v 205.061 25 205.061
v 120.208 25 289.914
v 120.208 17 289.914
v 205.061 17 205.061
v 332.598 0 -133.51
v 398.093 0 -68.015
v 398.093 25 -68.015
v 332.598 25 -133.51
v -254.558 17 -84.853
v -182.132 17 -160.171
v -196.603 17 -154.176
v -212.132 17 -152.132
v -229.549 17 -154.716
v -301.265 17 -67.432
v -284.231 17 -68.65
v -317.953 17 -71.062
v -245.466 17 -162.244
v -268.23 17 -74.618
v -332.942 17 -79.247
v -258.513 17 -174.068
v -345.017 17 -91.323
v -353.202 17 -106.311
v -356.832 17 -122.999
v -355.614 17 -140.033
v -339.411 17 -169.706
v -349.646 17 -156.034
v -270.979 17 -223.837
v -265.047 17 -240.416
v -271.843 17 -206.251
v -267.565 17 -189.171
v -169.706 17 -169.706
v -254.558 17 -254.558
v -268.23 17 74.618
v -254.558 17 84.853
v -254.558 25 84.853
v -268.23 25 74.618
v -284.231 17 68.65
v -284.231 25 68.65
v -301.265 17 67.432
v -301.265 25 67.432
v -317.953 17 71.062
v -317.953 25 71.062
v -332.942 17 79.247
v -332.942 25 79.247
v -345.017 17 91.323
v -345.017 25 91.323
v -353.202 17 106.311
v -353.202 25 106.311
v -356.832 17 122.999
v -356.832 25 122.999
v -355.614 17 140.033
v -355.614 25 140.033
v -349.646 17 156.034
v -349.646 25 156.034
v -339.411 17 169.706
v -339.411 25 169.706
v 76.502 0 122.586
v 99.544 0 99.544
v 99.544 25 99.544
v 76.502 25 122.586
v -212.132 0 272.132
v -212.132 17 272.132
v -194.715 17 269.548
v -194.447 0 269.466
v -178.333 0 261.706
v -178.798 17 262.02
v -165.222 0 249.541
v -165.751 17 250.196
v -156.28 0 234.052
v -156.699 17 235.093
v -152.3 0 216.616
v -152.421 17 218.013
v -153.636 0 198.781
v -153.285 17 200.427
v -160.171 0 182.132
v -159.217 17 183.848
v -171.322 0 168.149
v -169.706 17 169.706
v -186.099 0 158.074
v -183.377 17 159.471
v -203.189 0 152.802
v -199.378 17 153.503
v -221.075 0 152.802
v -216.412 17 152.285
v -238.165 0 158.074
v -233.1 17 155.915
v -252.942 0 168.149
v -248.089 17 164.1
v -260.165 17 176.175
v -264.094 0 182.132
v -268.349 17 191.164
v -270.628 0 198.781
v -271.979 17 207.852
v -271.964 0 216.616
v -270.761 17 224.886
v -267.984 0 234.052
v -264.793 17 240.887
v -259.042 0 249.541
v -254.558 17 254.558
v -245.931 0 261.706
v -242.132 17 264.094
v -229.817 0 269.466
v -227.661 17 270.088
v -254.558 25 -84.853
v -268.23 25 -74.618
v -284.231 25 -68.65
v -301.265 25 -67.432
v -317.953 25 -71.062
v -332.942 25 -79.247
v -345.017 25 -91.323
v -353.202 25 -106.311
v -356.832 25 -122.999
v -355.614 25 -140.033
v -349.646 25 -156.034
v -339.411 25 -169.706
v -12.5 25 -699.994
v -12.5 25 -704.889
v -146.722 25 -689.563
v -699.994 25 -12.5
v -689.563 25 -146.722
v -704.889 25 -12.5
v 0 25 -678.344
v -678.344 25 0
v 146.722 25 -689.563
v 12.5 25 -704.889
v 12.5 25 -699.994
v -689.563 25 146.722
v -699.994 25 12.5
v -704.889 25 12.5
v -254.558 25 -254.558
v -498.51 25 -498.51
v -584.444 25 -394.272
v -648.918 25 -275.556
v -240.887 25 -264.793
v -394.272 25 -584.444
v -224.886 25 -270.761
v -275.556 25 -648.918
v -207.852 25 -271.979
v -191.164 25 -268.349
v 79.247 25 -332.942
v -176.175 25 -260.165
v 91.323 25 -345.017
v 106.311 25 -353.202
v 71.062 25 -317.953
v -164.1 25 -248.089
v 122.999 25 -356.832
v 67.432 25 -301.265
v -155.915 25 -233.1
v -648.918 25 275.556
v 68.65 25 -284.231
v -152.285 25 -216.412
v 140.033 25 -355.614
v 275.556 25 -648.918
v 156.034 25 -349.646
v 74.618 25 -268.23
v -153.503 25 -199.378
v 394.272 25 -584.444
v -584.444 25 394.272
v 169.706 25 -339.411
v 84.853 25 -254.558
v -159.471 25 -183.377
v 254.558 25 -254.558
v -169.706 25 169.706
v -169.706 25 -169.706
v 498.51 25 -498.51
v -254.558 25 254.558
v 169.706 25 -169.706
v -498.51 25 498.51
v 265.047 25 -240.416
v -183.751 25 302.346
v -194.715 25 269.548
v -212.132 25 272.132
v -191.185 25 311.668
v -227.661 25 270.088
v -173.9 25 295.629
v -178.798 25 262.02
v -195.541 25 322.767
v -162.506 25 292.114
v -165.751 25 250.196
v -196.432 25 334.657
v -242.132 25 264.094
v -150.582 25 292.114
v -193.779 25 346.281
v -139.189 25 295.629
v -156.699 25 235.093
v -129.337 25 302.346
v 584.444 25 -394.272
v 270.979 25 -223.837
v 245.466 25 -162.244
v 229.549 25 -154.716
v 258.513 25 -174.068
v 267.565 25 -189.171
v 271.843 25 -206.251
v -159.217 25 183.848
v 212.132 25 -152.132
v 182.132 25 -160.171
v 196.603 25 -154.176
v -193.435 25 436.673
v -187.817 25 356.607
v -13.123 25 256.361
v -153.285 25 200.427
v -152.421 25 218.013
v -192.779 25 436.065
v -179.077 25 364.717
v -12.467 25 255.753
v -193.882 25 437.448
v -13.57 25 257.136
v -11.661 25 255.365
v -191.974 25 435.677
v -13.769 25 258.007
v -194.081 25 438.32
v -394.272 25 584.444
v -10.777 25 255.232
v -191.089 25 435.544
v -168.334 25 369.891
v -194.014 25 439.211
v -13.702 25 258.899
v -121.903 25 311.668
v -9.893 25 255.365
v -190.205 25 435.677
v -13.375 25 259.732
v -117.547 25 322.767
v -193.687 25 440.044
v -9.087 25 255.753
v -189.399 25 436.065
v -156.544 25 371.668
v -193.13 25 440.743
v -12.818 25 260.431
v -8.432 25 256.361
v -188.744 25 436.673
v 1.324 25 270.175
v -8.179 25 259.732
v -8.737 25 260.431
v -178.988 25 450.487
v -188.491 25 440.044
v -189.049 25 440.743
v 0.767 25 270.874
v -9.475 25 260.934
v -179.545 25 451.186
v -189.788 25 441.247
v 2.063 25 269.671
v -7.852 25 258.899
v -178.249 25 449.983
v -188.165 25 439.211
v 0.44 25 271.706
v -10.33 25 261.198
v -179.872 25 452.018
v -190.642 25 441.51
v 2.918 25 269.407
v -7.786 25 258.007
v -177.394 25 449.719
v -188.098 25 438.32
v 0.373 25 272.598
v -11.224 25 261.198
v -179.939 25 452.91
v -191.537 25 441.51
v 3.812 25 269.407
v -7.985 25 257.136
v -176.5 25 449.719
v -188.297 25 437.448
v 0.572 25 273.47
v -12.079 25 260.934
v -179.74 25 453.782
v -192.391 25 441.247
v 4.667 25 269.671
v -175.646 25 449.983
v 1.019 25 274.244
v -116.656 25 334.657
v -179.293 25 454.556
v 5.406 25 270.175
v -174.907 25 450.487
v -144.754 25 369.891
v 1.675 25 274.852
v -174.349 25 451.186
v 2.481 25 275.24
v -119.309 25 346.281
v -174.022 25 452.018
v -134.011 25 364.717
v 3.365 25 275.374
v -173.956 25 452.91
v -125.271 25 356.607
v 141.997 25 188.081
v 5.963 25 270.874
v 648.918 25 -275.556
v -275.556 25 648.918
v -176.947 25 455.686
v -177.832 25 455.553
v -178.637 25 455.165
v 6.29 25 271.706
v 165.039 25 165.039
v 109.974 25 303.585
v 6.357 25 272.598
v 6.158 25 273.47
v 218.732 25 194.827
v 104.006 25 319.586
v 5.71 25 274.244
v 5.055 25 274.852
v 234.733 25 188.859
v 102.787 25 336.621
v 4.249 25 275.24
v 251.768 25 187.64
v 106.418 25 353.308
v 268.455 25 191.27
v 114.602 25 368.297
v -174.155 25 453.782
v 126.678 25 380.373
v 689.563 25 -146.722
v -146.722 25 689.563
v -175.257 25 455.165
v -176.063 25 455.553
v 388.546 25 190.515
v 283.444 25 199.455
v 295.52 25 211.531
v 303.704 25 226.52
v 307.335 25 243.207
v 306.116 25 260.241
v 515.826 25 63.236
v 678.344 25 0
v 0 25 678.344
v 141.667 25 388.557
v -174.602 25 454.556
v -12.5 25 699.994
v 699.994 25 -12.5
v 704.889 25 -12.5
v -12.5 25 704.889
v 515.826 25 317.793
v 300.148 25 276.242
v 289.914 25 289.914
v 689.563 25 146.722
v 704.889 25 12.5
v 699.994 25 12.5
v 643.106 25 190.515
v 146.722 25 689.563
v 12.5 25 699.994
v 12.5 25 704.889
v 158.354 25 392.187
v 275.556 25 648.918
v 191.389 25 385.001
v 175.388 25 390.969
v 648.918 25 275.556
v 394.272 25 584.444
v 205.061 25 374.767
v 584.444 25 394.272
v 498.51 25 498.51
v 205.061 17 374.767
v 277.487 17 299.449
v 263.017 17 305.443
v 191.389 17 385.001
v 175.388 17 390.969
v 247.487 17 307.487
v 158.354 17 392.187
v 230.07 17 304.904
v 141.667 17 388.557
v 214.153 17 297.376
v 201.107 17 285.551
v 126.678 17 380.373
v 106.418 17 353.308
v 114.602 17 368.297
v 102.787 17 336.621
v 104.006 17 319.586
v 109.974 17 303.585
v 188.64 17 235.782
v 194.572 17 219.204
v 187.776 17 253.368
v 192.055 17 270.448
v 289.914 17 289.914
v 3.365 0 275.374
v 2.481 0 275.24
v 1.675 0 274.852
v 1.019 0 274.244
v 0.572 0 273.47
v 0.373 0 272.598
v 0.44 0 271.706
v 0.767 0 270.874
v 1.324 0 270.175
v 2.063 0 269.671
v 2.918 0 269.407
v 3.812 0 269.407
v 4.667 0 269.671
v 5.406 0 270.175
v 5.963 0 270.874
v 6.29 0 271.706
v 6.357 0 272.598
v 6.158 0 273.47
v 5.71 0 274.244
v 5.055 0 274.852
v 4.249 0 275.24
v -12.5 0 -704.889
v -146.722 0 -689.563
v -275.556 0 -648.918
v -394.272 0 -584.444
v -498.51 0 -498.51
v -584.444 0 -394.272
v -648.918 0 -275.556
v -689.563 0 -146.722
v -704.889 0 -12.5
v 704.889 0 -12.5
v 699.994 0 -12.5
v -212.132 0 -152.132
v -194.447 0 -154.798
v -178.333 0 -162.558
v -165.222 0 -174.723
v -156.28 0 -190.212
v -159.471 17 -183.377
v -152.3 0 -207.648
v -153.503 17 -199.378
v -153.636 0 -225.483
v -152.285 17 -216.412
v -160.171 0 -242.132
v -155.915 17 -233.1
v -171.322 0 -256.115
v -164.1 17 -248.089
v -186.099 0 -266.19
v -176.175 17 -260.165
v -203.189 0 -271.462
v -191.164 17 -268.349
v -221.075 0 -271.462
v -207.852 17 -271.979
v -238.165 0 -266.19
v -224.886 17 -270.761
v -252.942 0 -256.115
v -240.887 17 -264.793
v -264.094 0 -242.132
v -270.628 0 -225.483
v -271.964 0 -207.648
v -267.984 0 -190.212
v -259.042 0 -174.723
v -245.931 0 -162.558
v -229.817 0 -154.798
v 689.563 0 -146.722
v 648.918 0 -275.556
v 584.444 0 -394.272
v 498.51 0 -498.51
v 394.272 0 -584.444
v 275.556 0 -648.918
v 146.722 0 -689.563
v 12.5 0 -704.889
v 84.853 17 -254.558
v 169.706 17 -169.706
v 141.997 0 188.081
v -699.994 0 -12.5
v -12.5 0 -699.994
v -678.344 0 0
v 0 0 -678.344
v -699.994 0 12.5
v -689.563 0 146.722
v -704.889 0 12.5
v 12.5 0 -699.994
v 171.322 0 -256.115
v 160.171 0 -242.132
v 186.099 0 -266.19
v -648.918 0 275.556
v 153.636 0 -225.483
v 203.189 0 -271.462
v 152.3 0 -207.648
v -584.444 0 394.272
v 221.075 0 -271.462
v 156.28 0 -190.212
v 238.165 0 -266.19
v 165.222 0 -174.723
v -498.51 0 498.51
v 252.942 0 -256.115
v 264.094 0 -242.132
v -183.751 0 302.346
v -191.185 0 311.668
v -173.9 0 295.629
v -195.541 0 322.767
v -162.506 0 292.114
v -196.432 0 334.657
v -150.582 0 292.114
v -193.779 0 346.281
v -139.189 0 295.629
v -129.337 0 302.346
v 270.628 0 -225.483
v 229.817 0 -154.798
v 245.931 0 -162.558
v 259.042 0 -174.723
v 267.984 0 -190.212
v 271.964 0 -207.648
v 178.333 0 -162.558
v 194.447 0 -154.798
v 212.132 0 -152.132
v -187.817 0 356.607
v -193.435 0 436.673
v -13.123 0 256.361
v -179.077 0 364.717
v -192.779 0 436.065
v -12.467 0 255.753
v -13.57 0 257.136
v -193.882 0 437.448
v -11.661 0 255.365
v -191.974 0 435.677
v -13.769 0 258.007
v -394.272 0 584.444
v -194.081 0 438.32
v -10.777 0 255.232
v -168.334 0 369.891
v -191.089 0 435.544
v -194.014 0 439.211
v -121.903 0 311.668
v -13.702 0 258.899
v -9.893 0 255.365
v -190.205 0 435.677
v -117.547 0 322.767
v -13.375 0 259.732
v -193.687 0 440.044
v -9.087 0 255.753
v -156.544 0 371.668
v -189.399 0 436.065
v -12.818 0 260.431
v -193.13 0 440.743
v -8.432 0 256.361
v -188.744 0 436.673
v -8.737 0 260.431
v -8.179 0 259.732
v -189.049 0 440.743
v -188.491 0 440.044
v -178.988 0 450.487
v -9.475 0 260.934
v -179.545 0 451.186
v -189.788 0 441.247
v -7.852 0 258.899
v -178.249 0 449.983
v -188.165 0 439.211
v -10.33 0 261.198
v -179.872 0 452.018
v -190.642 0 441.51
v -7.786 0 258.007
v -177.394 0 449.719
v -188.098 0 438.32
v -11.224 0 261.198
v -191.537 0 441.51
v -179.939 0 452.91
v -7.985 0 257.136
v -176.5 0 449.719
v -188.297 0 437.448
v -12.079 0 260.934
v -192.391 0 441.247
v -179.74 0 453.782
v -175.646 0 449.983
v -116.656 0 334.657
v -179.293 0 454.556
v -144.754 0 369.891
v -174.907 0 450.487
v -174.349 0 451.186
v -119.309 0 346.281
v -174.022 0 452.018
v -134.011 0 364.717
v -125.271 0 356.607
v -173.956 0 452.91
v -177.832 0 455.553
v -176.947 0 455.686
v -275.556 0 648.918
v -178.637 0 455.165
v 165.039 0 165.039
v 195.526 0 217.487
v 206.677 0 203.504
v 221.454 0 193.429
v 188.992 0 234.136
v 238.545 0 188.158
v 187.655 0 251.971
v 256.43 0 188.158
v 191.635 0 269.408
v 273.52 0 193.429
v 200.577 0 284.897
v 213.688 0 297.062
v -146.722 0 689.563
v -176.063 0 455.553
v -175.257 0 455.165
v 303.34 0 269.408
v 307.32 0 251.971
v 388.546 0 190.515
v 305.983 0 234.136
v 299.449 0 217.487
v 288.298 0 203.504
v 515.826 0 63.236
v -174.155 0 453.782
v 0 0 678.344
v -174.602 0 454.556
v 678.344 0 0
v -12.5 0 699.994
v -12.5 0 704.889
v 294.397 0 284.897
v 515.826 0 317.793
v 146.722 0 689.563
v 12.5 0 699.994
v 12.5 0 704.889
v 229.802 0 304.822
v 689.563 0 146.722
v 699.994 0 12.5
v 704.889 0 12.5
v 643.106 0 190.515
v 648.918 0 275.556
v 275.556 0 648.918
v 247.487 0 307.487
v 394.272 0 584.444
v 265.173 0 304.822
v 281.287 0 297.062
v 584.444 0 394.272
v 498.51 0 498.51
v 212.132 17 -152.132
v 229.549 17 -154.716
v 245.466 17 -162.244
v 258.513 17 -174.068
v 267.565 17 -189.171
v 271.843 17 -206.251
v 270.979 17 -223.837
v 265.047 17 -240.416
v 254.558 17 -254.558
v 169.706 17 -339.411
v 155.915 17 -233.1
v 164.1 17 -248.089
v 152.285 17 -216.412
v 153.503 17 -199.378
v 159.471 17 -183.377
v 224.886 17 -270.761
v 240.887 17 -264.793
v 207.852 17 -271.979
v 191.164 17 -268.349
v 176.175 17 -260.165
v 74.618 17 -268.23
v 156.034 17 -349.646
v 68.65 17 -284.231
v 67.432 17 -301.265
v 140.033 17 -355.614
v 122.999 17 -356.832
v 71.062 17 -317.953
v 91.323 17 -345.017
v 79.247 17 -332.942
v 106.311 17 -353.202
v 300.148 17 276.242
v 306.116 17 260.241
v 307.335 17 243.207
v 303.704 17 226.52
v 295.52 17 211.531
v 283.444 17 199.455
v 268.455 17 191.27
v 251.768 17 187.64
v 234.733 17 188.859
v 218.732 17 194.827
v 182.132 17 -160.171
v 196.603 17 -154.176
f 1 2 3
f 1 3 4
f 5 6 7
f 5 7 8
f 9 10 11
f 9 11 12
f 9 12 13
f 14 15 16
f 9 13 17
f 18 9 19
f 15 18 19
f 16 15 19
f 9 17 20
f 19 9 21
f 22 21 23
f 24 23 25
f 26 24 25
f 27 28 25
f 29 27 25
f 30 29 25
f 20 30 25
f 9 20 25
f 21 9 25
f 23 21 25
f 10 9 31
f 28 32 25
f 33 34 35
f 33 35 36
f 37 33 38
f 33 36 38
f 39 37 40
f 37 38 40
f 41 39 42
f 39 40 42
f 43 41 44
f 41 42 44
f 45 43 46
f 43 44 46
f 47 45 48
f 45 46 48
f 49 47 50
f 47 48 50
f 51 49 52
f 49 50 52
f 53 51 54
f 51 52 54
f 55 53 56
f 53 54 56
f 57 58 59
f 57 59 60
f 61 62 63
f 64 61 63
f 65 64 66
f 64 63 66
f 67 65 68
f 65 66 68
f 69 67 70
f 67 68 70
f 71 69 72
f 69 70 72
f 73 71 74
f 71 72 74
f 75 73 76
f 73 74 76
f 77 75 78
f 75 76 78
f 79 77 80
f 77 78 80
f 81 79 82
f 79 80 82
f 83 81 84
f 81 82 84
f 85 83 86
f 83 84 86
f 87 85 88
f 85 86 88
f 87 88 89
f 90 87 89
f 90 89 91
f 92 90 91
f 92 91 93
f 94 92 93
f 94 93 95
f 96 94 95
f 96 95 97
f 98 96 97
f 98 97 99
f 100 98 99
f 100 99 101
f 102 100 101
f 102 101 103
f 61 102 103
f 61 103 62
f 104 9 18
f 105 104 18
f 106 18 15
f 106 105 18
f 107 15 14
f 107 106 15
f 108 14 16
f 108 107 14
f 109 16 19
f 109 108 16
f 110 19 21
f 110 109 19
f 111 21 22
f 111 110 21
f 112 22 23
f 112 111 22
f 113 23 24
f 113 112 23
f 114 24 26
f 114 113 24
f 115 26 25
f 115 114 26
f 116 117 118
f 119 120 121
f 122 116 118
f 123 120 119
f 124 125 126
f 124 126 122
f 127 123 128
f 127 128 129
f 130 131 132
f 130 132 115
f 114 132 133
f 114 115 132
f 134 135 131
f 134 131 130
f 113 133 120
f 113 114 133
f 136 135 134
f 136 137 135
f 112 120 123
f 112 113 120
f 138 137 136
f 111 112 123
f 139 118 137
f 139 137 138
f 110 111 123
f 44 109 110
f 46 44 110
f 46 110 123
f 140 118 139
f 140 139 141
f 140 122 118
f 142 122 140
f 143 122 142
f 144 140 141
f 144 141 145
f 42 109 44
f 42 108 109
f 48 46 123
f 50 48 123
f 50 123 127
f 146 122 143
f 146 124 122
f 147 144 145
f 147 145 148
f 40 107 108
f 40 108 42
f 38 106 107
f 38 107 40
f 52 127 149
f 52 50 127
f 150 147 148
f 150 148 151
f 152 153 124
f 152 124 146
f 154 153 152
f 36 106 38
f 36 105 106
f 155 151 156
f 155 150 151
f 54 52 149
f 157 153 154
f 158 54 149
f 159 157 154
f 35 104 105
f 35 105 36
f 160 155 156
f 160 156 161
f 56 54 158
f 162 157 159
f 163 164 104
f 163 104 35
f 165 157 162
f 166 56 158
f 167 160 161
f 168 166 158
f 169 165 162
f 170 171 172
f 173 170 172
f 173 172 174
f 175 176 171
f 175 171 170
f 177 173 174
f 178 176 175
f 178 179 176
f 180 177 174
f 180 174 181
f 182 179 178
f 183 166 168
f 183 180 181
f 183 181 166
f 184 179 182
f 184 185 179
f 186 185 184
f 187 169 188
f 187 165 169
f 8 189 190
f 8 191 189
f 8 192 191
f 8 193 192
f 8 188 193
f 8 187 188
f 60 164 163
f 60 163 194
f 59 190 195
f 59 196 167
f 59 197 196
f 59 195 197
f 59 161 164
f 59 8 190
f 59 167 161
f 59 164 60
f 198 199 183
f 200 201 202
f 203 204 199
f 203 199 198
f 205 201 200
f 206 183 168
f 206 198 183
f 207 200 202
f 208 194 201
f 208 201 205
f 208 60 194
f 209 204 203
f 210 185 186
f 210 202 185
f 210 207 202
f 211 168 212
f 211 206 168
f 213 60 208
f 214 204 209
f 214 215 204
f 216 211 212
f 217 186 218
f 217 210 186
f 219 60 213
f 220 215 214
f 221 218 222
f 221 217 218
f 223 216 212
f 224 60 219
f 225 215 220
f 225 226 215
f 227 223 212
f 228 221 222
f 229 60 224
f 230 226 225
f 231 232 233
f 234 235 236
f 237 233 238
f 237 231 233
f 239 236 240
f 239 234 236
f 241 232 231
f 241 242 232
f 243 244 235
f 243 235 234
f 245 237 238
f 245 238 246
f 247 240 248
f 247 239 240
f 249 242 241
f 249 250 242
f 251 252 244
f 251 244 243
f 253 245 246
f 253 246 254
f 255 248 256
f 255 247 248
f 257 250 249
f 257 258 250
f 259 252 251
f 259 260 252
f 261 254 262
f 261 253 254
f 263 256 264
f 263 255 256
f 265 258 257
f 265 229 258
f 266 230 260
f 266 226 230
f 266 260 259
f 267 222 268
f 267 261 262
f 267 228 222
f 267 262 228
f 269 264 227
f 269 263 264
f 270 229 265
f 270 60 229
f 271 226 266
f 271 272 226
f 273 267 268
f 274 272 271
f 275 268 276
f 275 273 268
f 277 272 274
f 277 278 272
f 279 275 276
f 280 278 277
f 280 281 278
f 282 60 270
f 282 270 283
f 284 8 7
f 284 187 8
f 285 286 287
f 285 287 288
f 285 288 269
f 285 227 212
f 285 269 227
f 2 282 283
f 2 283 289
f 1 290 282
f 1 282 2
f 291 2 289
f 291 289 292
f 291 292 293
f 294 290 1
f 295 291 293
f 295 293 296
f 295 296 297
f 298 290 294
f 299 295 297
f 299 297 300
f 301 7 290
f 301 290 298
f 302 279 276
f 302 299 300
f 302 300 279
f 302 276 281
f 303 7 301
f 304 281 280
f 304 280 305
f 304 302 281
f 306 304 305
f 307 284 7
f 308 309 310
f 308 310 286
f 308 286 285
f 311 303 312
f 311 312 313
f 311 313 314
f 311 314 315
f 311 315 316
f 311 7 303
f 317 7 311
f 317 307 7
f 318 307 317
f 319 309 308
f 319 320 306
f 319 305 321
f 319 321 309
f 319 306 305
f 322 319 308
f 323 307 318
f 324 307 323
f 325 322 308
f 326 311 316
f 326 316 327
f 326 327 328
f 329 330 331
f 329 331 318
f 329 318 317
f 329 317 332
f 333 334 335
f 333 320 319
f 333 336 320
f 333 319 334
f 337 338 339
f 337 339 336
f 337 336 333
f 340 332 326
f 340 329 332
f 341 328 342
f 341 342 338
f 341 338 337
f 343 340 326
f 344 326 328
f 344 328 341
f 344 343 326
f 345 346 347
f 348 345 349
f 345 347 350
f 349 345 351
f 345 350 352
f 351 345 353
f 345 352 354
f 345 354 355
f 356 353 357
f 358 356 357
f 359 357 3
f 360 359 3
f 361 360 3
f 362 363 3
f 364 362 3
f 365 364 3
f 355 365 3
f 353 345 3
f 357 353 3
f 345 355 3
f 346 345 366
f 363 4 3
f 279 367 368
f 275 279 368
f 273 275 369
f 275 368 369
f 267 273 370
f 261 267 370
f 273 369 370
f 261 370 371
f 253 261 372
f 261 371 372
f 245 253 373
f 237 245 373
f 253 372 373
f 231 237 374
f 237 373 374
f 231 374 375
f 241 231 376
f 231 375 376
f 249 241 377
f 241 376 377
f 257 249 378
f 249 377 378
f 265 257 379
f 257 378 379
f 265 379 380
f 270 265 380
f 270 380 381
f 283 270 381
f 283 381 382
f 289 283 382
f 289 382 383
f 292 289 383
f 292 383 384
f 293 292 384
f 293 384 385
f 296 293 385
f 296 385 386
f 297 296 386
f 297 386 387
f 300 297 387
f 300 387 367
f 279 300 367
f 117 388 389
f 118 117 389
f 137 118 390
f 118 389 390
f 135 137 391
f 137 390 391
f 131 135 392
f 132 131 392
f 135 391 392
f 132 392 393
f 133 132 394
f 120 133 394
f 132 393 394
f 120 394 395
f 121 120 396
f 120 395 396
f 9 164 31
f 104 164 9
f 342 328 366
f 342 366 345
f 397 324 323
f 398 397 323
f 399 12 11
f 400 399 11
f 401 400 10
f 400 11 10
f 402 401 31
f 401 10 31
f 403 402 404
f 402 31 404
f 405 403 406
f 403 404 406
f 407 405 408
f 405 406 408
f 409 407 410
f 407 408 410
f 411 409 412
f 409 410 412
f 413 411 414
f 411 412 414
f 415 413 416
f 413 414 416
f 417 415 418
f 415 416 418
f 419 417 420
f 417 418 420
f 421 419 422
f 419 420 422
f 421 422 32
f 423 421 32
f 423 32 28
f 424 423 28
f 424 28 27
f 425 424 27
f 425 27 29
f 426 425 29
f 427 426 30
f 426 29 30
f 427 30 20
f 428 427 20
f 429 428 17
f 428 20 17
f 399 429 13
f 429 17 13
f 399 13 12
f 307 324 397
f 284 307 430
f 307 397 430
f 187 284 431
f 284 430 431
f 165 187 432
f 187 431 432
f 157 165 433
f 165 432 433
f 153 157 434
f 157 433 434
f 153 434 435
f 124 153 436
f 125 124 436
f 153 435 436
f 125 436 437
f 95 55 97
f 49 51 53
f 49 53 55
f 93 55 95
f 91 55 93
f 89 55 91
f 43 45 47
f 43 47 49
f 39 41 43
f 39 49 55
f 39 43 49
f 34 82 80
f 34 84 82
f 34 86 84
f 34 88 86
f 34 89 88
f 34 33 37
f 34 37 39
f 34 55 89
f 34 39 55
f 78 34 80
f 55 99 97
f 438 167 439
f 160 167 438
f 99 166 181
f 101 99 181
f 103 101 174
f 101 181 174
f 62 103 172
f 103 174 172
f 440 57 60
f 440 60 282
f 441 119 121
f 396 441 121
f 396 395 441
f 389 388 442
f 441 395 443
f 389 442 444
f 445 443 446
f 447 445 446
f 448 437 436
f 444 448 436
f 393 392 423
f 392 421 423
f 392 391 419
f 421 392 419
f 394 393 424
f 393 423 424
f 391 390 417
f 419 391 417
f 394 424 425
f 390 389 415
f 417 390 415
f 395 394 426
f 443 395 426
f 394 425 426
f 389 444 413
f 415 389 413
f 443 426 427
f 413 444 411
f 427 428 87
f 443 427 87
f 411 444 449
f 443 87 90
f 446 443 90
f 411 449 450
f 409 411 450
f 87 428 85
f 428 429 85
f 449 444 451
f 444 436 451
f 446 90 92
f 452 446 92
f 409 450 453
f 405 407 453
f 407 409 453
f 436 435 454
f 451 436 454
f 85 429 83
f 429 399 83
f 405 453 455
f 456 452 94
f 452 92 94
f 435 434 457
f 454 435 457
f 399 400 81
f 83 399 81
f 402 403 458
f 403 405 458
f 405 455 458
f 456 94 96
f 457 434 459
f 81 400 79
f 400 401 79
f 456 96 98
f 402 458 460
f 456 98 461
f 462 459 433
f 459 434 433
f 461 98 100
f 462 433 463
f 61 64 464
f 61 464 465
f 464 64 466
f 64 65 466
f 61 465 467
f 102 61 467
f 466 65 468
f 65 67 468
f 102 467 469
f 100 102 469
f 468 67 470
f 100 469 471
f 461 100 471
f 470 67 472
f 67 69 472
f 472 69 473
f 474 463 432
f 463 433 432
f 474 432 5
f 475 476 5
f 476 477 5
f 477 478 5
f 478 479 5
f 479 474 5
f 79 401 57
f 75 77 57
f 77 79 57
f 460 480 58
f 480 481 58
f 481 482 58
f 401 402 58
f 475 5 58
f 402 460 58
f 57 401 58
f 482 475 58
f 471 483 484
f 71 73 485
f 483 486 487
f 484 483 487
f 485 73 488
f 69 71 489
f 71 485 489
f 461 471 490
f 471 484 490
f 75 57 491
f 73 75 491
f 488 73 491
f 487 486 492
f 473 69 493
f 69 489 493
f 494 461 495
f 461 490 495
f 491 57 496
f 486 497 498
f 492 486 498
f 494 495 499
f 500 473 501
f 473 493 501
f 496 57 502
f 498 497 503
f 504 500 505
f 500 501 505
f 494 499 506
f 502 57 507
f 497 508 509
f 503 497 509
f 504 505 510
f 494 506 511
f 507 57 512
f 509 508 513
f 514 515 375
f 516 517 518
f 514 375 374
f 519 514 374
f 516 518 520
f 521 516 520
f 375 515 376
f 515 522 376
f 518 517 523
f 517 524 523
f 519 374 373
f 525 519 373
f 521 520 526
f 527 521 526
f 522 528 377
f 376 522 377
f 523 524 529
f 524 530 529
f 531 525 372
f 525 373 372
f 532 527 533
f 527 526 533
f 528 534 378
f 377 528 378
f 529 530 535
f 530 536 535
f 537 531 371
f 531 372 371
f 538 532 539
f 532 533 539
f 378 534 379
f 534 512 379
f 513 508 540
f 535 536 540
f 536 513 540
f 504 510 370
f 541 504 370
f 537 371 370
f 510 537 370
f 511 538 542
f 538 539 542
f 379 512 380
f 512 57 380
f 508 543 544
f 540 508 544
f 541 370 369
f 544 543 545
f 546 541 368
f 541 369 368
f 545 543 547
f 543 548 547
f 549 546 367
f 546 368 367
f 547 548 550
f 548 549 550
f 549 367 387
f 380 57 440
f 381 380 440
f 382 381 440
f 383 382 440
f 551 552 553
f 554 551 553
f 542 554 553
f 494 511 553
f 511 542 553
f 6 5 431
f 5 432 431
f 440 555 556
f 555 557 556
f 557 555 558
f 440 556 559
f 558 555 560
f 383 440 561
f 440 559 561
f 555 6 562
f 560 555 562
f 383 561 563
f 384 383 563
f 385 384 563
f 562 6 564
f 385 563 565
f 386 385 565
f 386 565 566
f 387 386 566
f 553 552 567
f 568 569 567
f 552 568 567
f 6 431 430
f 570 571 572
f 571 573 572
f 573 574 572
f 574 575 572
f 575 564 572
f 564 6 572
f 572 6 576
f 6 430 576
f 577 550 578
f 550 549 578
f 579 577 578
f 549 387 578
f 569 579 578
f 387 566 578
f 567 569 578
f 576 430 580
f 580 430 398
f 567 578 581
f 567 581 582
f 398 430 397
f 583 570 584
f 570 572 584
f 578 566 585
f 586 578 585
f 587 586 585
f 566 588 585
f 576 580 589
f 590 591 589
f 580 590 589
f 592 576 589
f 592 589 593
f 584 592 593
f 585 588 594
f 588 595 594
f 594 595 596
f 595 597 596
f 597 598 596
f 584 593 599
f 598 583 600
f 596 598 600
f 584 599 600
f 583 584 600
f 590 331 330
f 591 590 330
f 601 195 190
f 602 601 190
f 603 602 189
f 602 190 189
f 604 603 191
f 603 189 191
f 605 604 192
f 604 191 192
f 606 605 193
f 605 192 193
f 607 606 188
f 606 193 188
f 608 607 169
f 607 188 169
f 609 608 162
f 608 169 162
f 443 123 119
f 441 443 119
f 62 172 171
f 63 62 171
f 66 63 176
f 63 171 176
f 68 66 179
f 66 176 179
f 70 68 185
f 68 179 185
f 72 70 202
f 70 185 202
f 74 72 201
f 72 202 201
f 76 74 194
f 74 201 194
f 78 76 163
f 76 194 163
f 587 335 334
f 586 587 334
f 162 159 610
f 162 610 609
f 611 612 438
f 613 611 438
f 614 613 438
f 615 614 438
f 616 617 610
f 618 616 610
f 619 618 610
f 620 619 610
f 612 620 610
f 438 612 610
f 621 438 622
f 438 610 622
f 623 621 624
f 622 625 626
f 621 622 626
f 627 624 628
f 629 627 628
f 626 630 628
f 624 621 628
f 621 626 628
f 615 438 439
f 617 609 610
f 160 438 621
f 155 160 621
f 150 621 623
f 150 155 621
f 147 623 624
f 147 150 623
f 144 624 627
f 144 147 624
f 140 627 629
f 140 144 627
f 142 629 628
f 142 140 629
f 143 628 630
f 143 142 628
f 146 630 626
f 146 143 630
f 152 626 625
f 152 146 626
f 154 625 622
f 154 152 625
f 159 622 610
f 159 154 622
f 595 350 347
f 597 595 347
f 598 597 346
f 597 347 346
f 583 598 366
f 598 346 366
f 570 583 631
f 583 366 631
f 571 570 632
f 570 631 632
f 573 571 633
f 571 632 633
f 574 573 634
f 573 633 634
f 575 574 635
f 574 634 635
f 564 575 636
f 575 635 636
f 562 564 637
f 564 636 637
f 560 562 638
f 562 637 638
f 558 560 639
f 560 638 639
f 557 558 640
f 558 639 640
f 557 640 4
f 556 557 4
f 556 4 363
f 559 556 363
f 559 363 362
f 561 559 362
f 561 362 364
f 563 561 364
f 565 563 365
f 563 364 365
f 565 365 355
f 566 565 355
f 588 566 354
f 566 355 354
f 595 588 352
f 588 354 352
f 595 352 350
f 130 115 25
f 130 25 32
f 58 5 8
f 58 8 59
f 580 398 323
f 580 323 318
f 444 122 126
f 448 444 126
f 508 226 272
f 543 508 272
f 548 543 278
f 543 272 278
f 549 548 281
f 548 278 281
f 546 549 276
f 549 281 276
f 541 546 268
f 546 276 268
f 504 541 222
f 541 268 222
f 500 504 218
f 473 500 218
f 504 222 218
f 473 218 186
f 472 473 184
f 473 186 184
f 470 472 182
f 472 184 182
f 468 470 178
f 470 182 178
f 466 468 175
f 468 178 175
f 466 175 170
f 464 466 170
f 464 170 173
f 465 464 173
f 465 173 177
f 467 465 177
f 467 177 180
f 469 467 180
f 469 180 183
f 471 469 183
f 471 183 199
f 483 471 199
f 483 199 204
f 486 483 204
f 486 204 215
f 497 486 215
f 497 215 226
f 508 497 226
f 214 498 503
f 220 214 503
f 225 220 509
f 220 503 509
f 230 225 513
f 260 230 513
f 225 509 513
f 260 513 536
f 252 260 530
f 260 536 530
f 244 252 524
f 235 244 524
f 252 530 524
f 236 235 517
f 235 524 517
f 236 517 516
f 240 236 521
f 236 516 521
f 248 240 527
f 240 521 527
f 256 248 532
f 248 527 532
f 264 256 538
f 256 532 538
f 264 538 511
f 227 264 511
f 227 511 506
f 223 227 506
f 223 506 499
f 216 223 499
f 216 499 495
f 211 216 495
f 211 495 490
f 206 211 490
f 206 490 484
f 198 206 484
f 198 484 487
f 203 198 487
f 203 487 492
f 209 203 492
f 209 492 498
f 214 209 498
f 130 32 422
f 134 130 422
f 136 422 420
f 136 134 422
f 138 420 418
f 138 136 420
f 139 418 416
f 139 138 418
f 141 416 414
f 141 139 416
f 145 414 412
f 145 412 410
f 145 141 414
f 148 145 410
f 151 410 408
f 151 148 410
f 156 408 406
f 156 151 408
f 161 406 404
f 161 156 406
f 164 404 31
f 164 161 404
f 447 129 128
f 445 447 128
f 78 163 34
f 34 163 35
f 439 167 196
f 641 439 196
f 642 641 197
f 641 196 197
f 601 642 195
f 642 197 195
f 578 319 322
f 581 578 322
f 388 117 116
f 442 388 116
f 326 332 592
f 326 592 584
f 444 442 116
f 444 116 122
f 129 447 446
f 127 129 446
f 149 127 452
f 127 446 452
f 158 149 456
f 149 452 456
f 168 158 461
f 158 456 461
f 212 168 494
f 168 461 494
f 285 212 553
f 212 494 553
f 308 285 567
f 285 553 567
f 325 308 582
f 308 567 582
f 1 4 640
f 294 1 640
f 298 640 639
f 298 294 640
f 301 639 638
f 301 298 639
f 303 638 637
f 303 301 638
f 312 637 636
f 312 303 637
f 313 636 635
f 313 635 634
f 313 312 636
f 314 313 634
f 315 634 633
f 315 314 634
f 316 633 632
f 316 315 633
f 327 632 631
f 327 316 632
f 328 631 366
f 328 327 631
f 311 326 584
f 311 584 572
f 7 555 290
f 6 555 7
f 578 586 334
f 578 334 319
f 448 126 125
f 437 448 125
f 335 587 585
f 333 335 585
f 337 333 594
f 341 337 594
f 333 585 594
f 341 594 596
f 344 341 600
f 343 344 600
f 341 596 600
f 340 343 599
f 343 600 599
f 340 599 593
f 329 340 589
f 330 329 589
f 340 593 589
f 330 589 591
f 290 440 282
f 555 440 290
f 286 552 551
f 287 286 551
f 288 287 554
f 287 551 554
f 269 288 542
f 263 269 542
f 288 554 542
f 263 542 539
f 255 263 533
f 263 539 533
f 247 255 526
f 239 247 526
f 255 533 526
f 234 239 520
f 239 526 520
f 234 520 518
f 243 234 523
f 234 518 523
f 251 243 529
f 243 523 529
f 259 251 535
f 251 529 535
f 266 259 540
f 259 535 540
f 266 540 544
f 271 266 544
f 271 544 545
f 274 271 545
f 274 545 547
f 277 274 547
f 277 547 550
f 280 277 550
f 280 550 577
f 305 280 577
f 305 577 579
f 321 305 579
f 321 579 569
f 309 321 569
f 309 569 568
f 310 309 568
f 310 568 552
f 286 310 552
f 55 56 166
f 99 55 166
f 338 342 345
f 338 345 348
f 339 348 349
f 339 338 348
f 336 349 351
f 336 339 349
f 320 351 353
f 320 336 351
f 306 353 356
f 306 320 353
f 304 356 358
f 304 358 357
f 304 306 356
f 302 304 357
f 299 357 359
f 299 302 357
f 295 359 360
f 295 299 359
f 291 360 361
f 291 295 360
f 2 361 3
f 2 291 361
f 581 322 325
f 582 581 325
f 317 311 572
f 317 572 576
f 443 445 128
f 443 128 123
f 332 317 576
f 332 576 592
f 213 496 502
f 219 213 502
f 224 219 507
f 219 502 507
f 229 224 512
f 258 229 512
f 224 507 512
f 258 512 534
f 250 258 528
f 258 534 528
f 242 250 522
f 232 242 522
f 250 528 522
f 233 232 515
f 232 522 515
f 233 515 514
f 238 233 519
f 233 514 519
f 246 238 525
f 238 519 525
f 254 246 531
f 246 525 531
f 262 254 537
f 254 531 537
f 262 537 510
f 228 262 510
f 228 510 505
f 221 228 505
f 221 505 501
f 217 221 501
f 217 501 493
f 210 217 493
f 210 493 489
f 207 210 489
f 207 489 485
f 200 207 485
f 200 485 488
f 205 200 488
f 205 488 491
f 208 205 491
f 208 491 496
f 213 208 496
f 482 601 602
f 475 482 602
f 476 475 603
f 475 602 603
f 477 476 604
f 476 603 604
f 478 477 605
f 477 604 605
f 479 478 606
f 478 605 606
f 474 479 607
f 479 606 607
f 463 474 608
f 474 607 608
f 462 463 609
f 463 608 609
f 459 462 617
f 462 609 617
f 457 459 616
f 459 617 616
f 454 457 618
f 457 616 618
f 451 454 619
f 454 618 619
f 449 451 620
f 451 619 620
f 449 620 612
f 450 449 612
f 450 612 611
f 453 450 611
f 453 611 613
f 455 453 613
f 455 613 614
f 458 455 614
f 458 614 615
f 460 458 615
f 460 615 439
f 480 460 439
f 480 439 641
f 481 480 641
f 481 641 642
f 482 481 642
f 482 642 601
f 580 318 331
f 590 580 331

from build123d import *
from build123d.topology import SkipClean

# Parameters (mm, degrees)
SKETCH_1_R               = 705
EXTRUDE_1_DEPTH          = 25
CUT_EXTRUDE_1_REACH      = 999.334
PATTERN_CIRCULAR_1_COUNT = 4
CUT_EXTRUDE_2_REACH      = 999.177
SKETCH_8_R               = 60
CUT_EXTRUDE_3_DEPTH      = 998.177266087
CUT_EXTRUDE_7_DEPTH      = 998.177266087
CUT_EXTRUDE_8_DEPTH      = 998.177266087
SKETCH_18_R              = 40
CUT_EXTRUDE_13_DEPTH     = 998.177266087
SKETCH_19_R              = 3
CUT_EXTRUDE_14_DEPTH     = 100
CUT_EXTRUDE_15_DEPTH     = 8


with BuildPart() as part:
    # 草图1 → 凸台-拉伸1 (new body)
    with BuildSketch(Plane(origin=(0, 0, 0), x_dir=(1, 0, 0), z_dir=(0, 1, 0))):
        with Locations(Location((0, 0, 0), (0, 0, 270))):
            Circle(SKETCH_1_R)
    extrude(amount=EXTRUDE_1_DEPTH)

    # 草图2 → 切除-拉伸1 (cut, up to next)
    with BuildSketch(Plane(origin=(0, 25, 0), x_dir=(1, 0, 0), z_dir=(0, 1, 0)), mode=Mode.PRIVATE) as cut_extrude_1_sk1:
        with BuildLine():
            Line((-12.5, -699.994189271), (-12.5, -704.889175687))
            ThreePointArc((-12.5, -704.889175687), (0, -705), (12.5, -704.889175687))
            Line((12.5, -704.889175687), (12.5, -699.994189271))
            Line((12.5, -699.994189271), (0, -678.343554177))
            Line((0, -678.343554177), (-12.5, -699.994189271))
        make_face()
    cut_extrude_1_tool1 = extrude(cut_extrude_1_sk1.sketch, amount=-CUT_EXTRUDE_1_REACH, mode=Mode.PRIVATE) & part.part
    cut_extrude_1 = cut_extrude_1_tool1.solids().sort_by_distance((0, 25, 695.82939))[0]
    add(cut_extrude_1, mode=Mode.SUBTRACT)

    # 阵列(圆周)1: 切除-拉伸1 ×4 about axis
    pattern_circular_1_axis = Axis((0, 0, 0), (0, 1, 0))
    for i in range(1, PATTERN_CIRCULAR_1_COUNT):
        add(cut_extrude_1.rotate(pattern_circular_1_axis, i * 360 / PATTERN_CIRCULAR_1_COUNT), mode=Mode.SUBTRACT)

    # 草图8 → 切除-拉伸2 (cut, up to next)
    with BuildSketch(Plane(origin=(0, 25, 0), x_dir=(1, 0, 0), z_dir=(0, 1, 0)), mode=Mode.PRIVATE) as cut_extrude_2_sk1:
        with Locations(Location((247.487373415, -247.487373415, 0), (0, 0, 270))):
            Circle(SKETCH_8_R)
    cut_extrude_2_tool1 = extrude(cut_extrude_2_sk1.sketch, amount=-CUT_EXTRUDE_2_REACH, mode=Mode.PRIVATE) & part.part
    # 草图8 → 切除-拉伸2 (cut, up to next)
    with BuildSketch(Plane(origin=(0, 25, 0), x_dir=(1, 0, 0), z_dir=(0, 1, 0)), mode=Mode.PRIVATE) as cut_extrude_2_sk2:
        with Locations(Location((-212.132034356, -212.132034356, 0), (0, 0, 270))):
            Circle(SKETCH_8_R)
    cut_extrude_2_tool2 = extrude(cut_extrude_2_sk2.sketch, amount=-CUT_EXTRUDE_2_REACH, mode=Mode.PRIVATE) & part.part
    # 草图8 → 切除-拉伸2 (cut, up to next)
    with BuildSketch(Plane(origin=(0, 25, 0), x_dir=(1, 0, 0), z_dir=(0, 1, 0)), mode=Mode.PRIVATE) as cut_extrude_2_sk3:
        with Locations(Location((-212.132034356, 212.132034356, 0), (0, 0, 270))):
            Circle(SKETCH_8_R)
    cut_extrude_2_tool3 = extrude(cut_extrude_2_sk3.sketch, amount=-CUT_EXTRUDE_2_REACH, mode=Mode.PRIVATE) & part.part
    # 草图8 → 切除-拉伸2 (cut, up to next)
    with BuildSketch(Plane(origin=(0, 25, 0), x_dir=(1, 0, 0), z_dir=(0, 1, 0)), mode=Mode.PRIVATE) as cut_extrude_2_sk4:
        with Locations(Location((212.132034356, 212.132034356, 0), (0, 0, 270))):
            Circle(SKETCH_8_R)
    cut_extrude_2_tool4 = extrude(cut_extrude_2_sk4.sketch, amount=-CUT_EXTRUDE_2_REACH, mode=Mode.PRIVATE) & part.part
    add(cut_extrude_2_tool1.solids().sort_by_distance((247.487373, 25, 247.487373))[0], mode=Mode.SUBTRACT)
    add(cut_extrude_2_tool2.solids().sort_by_distance((-212.132034, 25, 212.132034))[0], mode=Mode.SUBTRACT)
    add(cut_extrude_2_tool3.solids().sort_by_distance((-212.132034, 25, -212.132034))[0], mode=Mode.SUBTRACT)
    add(cut_extrude_2_tool4.solids().sort_by_distance((212.132034, 25, -212.132034))[0], mode=Mode.SUBTRACT)

    # 草图9 → 切除-拉伸3 (cut, through all)
    with BuildSketch(Plane(origin=(0, 25, 0), x_dir=(1, 0, 0), z_dir=(0, 1, 0))):
        Polygon((388.545974556, -190.514916099), (515.825974556, -63.236474876), (643.105974556, -190.514916099), (515.825974556, -317.793357321), align=None)
    extrude(amount=-CUT_EXTRUDE_3_DEPTH, mode=Mode.SUBTRACT)

    # 草图13 → 切除-拉伸7 (cut, through all)
    with BuildSketch(Plane.XZ):
        Polygon((165.039343844, 165.039343844), (398.093317994, -68.014630305), (332.597815836, -133.510132463), (99.543841687, 99.543841687), align=None)
    extrude(amount=-CUT_EXTRUDE_7_DEPTH, mode=Mode.SUBTRACT)

    # 草图14 → 切除-拉伸8 (cut, through all)
    with BuildSketch(Plane.XZ):
        Polygon((165.039343844, 165.039343844), (99.543841687, 99.543841687), (76.501917102, 122.585766271), (141.99741926, 188.081268429), align=None)
    extrude(amount=-CUT_EXTRUDE_8_DEPTH, mode=Mode.SUBTRACT)

    # 草图18 → 切除-拉伸13 (cut, through all)
    with BuildSketch(Plane(origin=(0, 25, 0), x_dir=(1, 0, 0), z_dir=(0, 1, 0))):
        with Locations(Location((-156.54417142, -331.667653242, 0), (0, 0, 270))):
            Circle(SKETCH_18_R)
    extrude(amount=-CUT_EXTRUDE_13_DEPTH, mode=Mode.SUBTRACT)

    # 草图19 → 切除-拉伸14 (cut)
    with BuildSketch(Plane.XZ):
        with Locations(Location((-10.777149233, 258.231573261, 0), (0, 0, 270))):
            Circle(SKETCH_19_R)
        with Locations(Location((-191.089378436, 438.543802464, 0), (0, 0, 270))):
            Circle(SKETCH_19_R)
        with Locations(Location((3.36498639, 272.373708885, 0), (0, 0, 90))):
            Circle(SKETCH_19_R)
        with Locations(Location((-176.947242812, 452.685938088, 0), (0, 0, 90))):
            Circle(SKETCH_19_R)
    extrude(amount=-CUT_EXTRUDE_14_DEPTH, mode=Mode.SUBTRACT)

    # 草图20 → 切除-拉伸15 (cut)
    with SkipClean():  # the faces are left unmerged after this step: merging them gives an invalid solid
        with BuildSketch(Plane(origin=(0, 25, 0), x_dir=(1, 0, 0), z_dir=(0, 1, 0))):
            with BuildLine():
                Line((169.705627485, 169.705627485), (84.852813742, 254.558441227))
                ThreePointArc((84.852813742, 254.558441227), (84.852813742, 339.41125497), (169.705627485, 339.41125497))
                Line((169.705627485, 339.41125497), (254.558441227, 254.558441227))
                ThreePointArc((254.558441227, 254.558441227), (254.558441227, 169.705627485), (169.705627485, 169.705627485))
            make_face()
            with BuildLine():
                Line((-169.705627485, -169.705627485), (-254.558441227, -84.852813742))
                ThreePointArc((-254.558441227, -84.852813742), (-339.41125497, -84.852813742), (-339.41125497, -169.705627485))
                Line((-339.41125497, -169.705627485), (-254.558441227, -254.558441227))
                ThreePointArc((-254.558441227, -254.558441227), (-169.705627485, -254.558441227), (-169.705627485, -169.705627485))
            make_face()
            with BuildLine():
                Line((-169.705627485, 169.705627485), (-254.558441227, 84.852813742))
                ThreePointArc((-254.558441227, 84.852813742), (-339.41125497, 84.852813742), (-339.41125497, 169.705627485))
                Line((-339.41125497, 169.705627485), (-254.558441227, 254.558441227))
                ThreePointArc((-254.558441227, 254.558441227), (-169.705627485, 254.558441227), (-169.705627485, 169.705627485))
            make_face()
            with BuildLine():
                Line((289.913780286, -289.913780286), (205.060966544, -374.766594029))
                ThreePointArc((205.060966544, -374.766594029), (120.208152802, -374.766594029), (120.208152802, -289.913780286))
                Line((120.208152802, -289.913780286), (205.060966544, -205.060966544))
                ThreePointArc((205.060966544, -205.060966544), (289.913780286, -205.060966544), (289.913780286, -289.913780286))
            make_face()
        extrude(amount=-CUT_EXTRUDE_15_DEPTH, mode=Mode.SUBTRACT)


solid = part.part
